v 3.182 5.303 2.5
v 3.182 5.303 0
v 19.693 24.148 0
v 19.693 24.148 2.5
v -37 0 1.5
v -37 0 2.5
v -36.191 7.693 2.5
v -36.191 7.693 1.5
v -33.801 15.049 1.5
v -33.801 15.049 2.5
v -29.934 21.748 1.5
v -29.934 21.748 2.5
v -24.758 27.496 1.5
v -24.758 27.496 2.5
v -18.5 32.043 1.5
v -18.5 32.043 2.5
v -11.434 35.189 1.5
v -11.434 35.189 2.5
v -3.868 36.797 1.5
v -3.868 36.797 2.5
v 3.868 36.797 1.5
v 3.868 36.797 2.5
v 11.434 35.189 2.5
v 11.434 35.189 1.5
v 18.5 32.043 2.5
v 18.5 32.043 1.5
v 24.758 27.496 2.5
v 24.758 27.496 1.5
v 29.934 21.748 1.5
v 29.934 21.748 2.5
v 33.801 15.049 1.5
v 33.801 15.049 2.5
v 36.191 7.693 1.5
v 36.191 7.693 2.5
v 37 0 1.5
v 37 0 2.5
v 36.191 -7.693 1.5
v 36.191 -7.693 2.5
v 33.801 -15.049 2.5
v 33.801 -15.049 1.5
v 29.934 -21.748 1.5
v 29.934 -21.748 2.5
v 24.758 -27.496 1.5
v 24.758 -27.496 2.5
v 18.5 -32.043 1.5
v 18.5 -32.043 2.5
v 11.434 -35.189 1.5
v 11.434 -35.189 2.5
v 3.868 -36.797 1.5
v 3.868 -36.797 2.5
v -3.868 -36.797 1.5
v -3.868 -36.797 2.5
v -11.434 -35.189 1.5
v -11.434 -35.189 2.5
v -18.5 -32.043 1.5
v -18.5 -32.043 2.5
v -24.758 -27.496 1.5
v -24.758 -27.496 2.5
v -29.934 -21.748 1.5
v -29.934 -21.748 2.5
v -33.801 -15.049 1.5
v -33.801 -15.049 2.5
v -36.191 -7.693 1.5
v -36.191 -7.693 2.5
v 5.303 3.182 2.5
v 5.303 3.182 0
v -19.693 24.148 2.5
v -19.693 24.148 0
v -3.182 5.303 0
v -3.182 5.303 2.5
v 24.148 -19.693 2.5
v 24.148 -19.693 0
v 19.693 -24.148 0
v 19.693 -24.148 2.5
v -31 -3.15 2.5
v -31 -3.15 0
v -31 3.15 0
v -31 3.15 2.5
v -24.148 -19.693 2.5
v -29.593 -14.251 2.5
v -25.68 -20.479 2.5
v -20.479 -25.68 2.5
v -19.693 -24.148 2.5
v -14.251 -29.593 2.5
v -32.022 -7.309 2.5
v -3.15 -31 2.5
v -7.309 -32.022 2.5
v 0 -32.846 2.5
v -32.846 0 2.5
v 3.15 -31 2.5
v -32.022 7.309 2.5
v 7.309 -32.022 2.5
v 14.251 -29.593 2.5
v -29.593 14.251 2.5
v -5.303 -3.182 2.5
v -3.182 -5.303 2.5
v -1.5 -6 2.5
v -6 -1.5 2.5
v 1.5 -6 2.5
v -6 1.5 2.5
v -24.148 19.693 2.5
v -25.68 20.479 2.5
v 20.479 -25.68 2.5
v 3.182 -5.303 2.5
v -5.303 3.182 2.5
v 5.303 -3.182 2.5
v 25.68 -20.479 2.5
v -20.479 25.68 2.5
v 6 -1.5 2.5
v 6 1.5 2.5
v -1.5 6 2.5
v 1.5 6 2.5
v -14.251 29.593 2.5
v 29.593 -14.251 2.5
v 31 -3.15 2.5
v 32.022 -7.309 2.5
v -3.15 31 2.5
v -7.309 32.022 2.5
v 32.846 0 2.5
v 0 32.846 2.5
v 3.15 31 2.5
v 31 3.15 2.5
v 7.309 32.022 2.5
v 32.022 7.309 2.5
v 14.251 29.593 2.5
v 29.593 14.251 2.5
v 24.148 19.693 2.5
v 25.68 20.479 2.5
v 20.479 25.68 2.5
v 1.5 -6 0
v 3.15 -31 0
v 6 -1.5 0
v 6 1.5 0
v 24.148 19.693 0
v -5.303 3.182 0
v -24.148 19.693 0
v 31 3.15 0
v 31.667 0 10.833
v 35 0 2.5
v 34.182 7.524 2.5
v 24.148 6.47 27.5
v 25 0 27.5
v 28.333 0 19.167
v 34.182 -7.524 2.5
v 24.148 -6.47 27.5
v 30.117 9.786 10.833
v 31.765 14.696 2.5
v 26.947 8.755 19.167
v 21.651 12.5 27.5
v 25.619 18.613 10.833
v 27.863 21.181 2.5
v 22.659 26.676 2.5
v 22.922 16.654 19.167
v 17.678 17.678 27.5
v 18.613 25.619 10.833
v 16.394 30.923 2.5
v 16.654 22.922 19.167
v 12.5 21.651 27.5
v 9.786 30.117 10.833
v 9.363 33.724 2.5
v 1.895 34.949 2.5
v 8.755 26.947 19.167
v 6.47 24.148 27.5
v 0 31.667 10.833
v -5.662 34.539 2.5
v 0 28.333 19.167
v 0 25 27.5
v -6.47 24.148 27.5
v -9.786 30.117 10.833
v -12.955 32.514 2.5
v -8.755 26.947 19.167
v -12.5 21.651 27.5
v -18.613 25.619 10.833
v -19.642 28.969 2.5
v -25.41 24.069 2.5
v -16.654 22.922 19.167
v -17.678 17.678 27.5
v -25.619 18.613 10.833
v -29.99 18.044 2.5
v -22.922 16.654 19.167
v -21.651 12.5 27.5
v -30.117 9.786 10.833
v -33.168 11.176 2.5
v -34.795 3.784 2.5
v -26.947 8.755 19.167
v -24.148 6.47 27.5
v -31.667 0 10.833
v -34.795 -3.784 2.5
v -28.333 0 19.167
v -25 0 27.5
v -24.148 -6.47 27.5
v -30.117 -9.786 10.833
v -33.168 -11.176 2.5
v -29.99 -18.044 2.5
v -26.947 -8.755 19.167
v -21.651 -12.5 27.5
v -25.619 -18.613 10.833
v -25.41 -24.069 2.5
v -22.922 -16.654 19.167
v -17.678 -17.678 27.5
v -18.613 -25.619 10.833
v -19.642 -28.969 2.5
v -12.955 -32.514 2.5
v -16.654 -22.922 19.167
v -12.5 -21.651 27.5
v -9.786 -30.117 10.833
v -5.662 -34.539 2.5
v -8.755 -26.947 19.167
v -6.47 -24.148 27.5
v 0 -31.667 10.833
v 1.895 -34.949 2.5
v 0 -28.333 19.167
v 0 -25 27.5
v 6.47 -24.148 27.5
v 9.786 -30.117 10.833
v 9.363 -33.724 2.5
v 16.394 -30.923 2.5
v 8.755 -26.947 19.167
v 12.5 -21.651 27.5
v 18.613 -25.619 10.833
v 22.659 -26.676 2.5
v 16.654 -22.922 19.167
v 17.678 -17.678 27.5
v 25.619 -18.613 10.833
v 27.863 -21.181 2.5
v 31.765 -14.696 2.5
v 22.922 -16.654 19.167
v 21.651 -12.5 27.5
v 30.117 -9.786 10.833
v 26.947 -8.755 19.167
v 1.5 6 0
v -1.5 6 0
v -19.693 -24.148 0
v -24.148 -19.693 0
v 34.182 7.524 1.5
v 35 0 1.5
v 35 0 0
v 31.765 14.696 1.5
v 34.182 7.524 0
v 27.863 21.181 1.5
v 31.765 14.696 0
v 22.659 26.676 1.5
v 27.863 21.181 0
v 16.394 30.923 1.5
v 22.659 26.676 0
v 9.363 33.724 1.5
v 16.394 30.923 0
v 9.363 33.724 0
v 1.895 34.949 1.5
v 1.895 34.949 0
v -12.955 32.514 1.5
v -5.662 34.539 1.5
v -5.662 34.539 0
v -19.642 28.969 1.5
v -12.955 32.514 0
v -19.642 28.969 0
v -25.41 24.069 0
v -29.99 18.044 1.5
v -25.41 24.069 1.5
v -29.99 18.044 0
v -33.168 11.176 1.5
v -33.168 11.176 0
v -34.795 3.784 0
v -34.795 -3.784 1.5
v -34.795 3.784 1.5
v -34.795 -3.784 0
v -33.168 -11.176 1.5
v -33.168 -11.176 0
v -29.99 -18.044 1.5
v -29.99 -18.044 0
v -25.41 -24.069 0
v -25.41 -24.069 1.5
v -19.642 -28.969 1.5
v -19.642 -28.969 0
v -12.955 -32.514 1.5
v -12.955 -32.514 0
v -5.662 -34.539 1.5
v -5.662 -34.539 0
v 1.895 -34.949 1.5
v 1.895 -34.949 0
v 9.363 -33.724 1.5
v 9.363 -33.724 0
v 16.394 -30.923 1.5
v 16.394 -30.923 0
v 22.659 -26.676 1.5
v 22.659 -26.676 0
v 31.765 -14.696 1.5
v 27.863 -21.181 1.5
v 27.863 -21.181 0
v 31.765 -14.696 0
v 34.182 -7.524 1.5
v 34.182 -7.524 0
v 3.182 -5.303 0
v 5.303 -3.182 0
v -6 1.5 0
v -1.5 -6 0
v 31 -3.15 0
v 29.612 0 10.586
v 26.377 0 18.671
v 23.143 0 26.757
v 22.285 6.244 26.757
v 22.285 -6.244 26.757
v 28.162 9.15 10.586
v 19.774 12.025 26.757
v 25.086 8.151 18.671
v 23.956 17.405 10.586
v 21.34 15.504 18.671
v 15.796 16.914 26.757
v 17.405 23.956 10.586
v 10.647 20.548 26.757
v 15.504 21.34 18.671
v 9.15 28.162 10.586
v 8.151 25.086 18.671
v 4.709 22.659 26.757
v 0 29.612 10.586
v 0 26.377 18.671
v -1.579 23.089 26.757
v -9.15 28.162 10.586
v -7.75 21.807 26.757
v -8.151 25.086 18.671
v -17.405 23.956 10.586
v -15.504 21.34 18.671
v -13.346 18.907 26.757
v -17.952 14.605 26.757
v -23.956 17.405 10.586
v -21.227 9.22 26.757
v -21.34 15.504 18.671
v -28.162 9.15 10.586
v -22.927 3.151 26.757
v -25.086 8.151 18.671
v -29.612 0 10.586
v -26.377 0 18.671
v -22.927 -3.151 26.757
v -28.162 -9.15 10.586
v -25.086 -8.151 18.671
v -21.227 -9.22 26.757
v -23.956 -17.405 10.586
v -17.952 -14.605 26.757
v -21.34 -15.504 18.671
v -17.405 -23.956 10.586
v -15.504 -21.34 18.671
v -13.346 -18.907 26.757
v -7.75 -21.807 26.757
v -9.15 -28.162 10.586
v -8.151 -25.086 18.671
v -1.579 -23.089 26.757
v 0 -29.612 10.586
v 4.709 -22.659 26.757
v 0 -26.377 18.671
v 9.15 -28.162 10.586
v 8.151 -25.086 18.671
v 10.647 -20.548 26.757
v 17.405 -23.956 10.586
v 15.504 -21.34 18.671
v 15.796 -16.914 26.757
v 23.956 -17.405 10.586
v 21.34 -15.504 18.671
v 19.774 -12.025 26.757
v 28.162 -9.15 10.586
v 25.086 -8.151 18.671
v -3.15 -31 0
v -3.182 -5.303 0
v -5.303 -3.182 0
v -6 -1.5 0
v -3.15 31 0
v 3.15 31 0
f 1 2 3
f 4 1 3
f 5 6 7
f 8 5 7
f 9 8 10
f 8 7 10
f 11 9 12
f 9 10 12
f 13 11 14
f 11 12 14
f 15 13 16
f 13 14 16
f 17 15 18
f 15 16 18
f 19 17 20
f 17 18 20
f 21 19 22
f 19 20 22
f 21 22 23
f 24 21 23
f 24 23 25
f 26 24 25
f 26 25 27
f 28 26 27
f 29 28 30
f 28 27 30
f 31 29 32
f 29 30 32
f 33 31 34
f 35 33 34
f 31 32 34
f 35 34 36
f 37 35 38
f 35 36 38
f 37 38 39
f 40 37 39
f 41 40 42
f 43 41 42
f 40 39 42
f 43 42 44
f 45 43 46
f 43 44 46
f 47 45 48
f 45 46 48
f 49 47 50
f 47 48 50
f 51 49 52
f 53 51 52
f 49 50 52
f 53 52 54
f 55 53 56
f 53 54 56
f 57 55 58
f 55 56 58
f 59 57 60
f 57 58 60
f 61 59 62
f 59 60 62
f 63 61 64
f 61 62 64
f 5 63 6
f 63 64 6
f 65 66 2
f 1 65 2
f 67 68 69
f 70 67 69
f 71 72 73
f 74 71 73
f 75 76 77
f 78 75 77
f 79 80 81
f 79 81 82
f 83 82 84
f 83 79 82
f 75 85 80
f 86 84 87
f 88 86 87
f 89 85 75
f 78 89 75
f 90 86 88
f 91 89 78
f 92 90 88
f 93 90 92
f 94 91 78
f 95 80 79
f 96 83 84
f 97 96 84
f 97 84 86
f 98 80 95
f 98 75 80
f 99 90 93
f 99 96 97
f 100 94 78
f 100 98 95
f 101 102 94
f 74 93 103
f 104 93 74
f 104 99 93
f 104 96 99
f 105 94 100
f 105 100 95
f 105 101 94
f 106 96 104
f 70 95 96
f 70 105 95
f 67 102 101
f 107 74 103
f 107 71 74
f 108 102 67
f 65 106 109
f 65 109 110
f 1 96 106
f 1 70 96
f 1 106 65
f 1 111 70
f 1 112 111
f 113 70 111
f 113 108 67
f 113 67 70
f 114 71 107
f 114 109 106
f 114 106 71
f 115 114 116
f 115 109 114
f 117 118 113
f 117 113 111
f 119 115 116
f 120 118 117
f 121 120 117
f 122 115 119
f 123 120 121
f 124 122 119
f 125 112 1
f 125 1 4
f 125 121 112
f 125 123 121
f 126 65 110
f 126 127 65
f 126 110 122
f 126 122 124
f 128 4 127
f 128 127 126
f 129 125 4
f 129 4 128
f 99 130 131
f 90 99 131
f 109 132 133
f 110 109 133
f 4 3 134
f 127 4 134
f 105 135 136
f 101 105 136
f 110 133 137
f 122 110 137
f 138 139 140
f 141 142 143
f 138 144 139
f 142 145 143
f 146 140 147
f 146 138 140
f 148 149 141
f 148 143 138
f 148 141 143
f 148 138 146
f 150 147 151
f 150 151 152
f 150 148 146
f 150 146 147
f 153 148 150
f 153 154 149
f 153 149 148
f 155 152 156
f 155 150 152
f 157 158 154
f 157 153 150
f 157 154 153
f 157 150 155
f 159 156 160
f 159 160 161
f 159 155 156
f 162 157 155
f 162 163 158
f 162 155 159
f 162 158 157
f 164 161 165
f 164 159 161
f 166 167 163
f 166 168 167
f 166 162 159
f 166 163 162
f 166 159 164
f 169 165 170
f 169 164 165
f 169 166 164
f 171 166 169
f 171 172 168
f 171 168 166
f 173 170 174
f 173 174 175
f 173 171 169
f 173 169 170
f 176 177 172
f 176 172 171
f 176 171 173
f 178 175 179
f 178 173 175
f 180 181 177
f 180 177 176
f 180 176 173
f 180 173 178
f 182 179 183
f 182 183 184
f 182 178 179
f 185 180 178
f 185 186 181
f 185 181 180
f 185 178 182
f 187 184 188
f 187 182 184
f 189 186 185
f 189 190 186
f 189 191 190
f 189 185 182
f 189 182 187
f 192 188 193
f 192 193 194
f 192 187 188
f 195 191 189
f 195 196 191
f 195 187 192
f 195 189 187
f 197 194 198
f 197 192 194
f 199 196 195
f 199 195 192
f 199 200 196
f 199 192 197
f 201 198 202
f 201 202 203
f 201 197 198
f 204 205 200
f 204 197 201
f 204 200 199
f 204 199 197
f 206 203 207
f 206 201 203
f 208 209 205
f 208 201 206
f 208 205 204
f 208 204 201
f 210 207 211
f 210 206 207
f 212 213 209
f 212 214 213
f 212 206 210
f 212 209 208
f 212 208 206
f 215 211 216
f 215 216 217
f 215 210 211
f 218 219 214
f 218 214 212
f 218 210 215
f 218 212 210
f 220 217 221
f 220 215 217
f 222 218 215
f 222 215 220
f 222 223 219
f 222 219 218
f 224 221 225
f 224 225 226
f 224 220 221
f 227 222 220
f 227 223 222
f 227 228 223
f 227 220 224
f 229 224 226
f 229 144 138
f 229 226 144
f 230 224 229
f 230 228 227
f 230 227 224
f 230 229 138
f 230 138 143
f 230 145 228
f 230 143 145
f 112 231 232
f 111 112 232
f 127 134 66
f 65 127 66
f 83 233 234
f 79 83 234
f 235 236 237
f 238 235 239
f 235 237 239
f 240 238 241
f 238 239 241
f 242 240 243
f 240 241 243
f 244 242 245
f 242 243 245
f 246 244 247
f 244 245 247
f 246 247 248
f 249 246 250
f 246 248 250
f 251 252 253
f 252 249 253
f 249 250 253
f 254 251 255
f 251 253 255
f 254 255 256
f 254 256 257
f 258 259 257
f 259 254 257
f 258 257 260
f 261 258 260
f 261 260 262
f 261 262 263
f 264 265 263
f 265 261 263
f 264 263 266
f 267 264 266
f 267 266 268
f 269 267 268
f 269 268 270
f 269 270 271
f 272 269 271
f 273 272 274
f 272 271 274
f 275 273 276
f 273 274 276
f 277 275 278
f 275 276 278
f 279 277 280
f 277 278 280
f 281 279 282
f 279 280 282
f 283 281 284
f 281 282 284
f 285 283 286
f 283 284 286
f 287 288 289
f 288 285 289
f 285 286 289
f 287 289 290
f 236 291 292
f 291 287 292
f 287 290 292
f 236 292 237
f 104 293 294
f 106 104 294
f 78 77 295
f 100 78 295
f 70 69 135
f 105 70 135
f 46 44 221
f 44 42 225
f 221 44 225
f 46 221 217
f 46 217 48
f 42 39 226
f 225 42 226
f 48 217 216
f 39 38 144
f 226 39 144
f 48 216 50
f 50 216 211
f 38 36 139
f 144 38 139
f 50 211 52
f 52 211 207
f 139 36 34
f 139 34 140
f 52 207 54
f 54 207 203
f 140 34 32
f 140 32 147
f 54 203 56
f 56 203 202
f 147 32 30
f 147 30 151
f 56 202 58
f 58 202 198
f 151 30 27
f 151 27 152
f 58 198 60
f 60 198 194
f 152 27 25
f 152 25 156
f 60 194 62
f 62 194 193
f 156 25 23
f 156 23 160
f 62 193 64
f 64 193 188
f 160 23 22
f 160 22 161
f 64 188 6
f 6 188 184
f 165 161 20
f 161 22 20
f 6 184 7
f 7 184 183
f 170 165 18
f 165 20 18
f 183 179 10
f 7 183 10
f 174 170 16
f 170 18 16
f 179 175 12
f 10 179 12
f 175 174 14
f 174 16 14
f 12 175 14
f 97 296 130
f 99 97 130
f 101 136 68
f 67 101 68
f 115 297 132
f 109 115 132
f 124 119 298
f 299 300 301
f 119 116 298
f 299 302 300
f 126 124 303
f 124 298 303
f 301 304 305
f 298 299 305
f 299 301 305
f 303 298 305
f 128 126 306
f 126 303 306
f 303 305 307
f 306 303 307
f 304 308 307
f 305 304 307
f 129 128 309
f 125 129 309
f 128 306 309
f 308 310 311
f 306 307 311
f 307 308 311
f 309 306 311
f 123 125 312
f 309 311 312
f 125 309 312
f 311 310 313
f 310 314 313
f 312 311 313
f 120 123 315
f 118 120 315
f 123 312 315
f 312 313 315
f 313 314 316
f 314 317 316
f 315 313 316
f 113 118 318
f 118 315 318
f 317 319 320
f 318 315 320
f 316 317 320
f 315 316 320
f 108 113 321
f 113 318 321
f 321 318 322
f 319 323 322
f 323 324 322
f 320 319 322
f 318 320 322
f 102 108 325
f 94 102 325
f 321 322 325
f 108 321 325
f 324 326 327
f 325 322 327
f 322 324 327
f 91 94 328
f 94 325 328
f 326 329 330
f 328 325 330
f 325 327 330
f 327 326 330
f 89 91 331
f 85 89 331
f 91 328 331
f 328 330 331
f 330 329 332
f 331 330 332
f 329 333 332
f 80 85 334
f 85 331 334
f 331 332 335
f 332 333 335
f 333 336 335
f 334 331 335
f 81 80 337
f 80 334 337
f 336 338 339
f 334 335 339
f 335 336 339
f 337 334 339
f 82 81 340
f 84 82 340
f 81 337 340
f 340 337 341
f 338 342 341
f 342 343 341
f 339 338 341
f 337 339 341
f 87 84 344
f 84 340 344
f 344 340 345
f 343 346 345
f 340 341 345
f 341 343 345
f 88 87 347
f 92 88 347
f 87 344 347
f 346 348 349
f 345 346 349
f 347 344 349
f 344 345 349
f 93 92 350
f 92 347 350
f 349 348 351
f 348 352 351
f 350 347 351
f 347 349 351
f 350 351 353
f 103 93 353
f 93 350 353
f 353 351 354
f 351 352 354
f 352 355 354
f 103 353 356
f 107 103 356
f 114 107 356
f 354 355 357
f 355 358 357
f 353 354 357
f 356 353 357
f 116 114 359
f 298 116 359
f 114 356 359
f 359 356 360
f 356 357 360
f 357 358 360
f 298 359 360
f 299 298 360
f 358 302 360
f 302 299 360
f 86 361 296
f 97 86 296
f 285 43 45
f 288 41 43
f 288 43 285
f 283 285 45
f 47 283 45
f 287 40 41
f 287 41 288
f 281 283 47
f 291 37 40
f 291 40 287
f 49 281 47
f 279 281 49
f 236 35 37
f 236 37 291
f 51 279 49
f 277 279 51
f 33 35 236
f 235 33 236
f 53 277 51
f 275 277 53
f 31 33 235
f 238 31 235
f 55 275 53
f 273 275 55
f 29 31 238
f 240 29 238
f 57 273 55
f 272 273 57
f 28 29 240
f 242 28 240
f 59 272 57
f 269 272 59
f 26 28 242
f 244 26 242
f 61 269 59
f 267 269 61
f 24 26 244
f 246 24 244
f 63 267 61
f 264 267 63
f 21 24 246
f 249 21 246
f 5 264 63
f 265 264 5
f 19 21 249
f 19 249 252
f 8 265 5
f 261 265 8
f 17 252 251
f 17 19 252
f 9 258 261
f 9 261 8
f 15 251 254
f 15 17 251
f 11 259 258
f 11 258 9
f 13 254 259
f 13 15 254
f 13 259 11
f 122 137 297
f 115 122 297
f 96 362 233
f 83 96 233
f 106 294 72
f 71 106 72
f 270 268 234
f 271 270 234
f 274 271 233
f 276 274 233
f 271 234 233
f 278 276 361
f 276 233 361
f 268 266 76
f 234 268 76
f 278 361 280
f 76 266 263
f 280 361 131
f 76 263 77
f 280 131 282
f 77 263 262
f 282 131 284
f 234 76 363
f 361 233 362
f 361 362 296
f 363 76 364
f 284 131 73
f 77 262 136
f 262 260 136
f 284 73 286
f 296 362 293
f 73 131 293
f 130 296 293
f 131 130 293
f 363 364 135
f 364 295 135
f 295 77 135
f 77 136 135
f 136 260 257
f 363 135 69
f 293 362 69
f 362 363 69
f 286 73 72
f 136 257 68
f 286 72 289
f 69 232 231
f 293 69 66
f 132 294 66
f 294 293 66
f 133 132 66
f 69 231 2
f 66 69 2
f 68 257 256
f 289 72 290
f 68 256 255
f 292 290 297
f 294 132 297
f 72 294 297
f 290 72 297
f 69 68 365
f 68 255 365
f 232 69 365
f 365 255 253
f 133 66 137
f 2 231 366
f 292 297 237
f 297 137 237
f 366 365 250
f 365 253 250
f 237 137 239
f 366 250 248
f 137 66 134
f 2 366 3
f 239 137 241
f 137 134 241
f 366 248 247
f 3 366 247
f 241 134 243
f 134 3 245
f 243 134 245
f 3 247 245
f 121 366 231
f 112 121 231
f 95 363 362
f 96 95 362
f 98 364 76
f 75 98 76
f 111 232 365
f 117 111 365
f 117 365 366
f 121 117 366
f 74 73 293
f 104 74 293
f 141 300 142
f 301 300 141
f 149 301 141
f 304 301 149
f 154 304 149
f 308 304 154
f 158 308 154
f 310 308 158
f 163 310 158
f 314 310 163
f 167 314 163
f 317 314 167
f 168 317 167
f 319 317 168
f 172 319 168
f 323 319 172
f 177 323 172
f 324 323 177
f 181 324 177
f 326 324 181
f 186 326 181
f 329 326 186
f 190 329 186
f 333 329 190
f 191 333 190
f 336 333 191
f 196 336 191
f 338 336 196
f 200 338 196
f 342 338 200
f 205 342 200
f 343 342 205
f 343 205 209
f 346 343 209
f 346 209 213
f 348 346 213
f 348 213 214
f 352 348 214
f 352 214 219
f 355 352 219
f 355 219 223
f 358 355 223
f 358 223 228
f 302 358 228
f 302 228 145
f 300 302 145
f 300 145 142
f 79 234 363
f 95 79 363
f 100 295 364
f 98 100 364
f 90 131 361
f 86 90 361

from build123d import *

# Parameters (mm, degrees)
BOSS_EXTRUDE1_OUTLINE_R = 35
BOSS_EXTRUDE1_DEPTH     = 2.5
THICKEN1_T2             = 2
SKETCH7_R               = 37
SKETCH7_R_2             = 33.5
BOSS_EXTRUDE2_DEPTH     = 1


# Read off the part's stored shape, not the designer's step: Boss-Extrude1
with BuildPart() as part:
    # Boss-Extrude1 outline → Boss-Extrude1 (new body)
    with BuildSketch(Plane.XY):
        Circle(BOSS_EXTRUDE1_OUTLINE_R)
        Polygon((-3.181980515, -5.303300859), (-19.692923856, -24.147696578), (-24.147696578, -19.692923856), (-5.303300859, -3.181980515), align=None, mode=Mode.SUBTRACT)
        Polygon((1.5, -6), (3.15, -31), (-3.15, -31), (-1.5, -6), align=None, mode=Mode.SUBTRACT)
        Polygon((5.303300859, -3.181980515), (24.147696578, -19.692923856), (19.692923856, -24.147696578), (3.181980515, -5.303300859), align=None, mode=Mode.SUBTRACT)
        Polygon((-6, -1.5), (-31, -3.15), (-31, 3.15), (-6, 1.5), align=None, mode=Mode.SUBTRACT)
        Polygon((-5.303300859, 3.181980515), (-24.147696578, 19.692923856), (-19.692923856, 24.147696578), (-3.181980515, 5.303300859), align=None, mode=Mode.SUBTRACT)
        Polygon((3.181980515, 5.303300859), (19.692923856, 24.147696578), (24.147696578, 19.692923856), (5.303300859, 3.181980515), align=None, mode=Mode.SUBTRACT)
        Polygon((6, 1.5), (31, 3.15), (31, -3.15), (6, -1.5), align=None, mode=Mode.SUBTRACT)
        Polygon((1.5, 6), (-1.5, 6), (-3.15, 31), (3.15, 31), align=None, mode=Mode.SUBTRACT)
    extrude(amount=BOSS_EXTRUDE1_DEPTH)

    # Surface-Loft3: a surface lofted through 2 sketches
    with BuildLine(Plane.XY.offset(2.5), mode=Mode.PRIVATE) as surface_loft3_1_s0:
        CenterArc((0, 0), 35, 0, 360)
    with BuildLine(Plane.XY.offset(27.5), mode=Mode.PRIVATE) as surface_loft3_1_s1:
        CenterArc((0, 0), 25, 0, 360)
    surface_loft3_1 = Shell.make_loft([surface_loft3_1_s0.wire(), surface_loft3_1_s1.wire()])
    add(Solid.thicken(surface_loft3_1, -THICKEN1_T2))

    # Sketch7 → Boss-Extrude2 (add)
    with BuildSketch(Plane(origin=(0, 0, 2.5), x_dir=(-1, 0, 0), z_dir=(0, 0, -1))):
        Circle(SKETCH7_R)
        Circle(SKETCH7_R_2, mode=Mode.SUBTRACT)
    extrude(amount=BOSS_EXTRUDE2_DEPTH)


solid = part.part
